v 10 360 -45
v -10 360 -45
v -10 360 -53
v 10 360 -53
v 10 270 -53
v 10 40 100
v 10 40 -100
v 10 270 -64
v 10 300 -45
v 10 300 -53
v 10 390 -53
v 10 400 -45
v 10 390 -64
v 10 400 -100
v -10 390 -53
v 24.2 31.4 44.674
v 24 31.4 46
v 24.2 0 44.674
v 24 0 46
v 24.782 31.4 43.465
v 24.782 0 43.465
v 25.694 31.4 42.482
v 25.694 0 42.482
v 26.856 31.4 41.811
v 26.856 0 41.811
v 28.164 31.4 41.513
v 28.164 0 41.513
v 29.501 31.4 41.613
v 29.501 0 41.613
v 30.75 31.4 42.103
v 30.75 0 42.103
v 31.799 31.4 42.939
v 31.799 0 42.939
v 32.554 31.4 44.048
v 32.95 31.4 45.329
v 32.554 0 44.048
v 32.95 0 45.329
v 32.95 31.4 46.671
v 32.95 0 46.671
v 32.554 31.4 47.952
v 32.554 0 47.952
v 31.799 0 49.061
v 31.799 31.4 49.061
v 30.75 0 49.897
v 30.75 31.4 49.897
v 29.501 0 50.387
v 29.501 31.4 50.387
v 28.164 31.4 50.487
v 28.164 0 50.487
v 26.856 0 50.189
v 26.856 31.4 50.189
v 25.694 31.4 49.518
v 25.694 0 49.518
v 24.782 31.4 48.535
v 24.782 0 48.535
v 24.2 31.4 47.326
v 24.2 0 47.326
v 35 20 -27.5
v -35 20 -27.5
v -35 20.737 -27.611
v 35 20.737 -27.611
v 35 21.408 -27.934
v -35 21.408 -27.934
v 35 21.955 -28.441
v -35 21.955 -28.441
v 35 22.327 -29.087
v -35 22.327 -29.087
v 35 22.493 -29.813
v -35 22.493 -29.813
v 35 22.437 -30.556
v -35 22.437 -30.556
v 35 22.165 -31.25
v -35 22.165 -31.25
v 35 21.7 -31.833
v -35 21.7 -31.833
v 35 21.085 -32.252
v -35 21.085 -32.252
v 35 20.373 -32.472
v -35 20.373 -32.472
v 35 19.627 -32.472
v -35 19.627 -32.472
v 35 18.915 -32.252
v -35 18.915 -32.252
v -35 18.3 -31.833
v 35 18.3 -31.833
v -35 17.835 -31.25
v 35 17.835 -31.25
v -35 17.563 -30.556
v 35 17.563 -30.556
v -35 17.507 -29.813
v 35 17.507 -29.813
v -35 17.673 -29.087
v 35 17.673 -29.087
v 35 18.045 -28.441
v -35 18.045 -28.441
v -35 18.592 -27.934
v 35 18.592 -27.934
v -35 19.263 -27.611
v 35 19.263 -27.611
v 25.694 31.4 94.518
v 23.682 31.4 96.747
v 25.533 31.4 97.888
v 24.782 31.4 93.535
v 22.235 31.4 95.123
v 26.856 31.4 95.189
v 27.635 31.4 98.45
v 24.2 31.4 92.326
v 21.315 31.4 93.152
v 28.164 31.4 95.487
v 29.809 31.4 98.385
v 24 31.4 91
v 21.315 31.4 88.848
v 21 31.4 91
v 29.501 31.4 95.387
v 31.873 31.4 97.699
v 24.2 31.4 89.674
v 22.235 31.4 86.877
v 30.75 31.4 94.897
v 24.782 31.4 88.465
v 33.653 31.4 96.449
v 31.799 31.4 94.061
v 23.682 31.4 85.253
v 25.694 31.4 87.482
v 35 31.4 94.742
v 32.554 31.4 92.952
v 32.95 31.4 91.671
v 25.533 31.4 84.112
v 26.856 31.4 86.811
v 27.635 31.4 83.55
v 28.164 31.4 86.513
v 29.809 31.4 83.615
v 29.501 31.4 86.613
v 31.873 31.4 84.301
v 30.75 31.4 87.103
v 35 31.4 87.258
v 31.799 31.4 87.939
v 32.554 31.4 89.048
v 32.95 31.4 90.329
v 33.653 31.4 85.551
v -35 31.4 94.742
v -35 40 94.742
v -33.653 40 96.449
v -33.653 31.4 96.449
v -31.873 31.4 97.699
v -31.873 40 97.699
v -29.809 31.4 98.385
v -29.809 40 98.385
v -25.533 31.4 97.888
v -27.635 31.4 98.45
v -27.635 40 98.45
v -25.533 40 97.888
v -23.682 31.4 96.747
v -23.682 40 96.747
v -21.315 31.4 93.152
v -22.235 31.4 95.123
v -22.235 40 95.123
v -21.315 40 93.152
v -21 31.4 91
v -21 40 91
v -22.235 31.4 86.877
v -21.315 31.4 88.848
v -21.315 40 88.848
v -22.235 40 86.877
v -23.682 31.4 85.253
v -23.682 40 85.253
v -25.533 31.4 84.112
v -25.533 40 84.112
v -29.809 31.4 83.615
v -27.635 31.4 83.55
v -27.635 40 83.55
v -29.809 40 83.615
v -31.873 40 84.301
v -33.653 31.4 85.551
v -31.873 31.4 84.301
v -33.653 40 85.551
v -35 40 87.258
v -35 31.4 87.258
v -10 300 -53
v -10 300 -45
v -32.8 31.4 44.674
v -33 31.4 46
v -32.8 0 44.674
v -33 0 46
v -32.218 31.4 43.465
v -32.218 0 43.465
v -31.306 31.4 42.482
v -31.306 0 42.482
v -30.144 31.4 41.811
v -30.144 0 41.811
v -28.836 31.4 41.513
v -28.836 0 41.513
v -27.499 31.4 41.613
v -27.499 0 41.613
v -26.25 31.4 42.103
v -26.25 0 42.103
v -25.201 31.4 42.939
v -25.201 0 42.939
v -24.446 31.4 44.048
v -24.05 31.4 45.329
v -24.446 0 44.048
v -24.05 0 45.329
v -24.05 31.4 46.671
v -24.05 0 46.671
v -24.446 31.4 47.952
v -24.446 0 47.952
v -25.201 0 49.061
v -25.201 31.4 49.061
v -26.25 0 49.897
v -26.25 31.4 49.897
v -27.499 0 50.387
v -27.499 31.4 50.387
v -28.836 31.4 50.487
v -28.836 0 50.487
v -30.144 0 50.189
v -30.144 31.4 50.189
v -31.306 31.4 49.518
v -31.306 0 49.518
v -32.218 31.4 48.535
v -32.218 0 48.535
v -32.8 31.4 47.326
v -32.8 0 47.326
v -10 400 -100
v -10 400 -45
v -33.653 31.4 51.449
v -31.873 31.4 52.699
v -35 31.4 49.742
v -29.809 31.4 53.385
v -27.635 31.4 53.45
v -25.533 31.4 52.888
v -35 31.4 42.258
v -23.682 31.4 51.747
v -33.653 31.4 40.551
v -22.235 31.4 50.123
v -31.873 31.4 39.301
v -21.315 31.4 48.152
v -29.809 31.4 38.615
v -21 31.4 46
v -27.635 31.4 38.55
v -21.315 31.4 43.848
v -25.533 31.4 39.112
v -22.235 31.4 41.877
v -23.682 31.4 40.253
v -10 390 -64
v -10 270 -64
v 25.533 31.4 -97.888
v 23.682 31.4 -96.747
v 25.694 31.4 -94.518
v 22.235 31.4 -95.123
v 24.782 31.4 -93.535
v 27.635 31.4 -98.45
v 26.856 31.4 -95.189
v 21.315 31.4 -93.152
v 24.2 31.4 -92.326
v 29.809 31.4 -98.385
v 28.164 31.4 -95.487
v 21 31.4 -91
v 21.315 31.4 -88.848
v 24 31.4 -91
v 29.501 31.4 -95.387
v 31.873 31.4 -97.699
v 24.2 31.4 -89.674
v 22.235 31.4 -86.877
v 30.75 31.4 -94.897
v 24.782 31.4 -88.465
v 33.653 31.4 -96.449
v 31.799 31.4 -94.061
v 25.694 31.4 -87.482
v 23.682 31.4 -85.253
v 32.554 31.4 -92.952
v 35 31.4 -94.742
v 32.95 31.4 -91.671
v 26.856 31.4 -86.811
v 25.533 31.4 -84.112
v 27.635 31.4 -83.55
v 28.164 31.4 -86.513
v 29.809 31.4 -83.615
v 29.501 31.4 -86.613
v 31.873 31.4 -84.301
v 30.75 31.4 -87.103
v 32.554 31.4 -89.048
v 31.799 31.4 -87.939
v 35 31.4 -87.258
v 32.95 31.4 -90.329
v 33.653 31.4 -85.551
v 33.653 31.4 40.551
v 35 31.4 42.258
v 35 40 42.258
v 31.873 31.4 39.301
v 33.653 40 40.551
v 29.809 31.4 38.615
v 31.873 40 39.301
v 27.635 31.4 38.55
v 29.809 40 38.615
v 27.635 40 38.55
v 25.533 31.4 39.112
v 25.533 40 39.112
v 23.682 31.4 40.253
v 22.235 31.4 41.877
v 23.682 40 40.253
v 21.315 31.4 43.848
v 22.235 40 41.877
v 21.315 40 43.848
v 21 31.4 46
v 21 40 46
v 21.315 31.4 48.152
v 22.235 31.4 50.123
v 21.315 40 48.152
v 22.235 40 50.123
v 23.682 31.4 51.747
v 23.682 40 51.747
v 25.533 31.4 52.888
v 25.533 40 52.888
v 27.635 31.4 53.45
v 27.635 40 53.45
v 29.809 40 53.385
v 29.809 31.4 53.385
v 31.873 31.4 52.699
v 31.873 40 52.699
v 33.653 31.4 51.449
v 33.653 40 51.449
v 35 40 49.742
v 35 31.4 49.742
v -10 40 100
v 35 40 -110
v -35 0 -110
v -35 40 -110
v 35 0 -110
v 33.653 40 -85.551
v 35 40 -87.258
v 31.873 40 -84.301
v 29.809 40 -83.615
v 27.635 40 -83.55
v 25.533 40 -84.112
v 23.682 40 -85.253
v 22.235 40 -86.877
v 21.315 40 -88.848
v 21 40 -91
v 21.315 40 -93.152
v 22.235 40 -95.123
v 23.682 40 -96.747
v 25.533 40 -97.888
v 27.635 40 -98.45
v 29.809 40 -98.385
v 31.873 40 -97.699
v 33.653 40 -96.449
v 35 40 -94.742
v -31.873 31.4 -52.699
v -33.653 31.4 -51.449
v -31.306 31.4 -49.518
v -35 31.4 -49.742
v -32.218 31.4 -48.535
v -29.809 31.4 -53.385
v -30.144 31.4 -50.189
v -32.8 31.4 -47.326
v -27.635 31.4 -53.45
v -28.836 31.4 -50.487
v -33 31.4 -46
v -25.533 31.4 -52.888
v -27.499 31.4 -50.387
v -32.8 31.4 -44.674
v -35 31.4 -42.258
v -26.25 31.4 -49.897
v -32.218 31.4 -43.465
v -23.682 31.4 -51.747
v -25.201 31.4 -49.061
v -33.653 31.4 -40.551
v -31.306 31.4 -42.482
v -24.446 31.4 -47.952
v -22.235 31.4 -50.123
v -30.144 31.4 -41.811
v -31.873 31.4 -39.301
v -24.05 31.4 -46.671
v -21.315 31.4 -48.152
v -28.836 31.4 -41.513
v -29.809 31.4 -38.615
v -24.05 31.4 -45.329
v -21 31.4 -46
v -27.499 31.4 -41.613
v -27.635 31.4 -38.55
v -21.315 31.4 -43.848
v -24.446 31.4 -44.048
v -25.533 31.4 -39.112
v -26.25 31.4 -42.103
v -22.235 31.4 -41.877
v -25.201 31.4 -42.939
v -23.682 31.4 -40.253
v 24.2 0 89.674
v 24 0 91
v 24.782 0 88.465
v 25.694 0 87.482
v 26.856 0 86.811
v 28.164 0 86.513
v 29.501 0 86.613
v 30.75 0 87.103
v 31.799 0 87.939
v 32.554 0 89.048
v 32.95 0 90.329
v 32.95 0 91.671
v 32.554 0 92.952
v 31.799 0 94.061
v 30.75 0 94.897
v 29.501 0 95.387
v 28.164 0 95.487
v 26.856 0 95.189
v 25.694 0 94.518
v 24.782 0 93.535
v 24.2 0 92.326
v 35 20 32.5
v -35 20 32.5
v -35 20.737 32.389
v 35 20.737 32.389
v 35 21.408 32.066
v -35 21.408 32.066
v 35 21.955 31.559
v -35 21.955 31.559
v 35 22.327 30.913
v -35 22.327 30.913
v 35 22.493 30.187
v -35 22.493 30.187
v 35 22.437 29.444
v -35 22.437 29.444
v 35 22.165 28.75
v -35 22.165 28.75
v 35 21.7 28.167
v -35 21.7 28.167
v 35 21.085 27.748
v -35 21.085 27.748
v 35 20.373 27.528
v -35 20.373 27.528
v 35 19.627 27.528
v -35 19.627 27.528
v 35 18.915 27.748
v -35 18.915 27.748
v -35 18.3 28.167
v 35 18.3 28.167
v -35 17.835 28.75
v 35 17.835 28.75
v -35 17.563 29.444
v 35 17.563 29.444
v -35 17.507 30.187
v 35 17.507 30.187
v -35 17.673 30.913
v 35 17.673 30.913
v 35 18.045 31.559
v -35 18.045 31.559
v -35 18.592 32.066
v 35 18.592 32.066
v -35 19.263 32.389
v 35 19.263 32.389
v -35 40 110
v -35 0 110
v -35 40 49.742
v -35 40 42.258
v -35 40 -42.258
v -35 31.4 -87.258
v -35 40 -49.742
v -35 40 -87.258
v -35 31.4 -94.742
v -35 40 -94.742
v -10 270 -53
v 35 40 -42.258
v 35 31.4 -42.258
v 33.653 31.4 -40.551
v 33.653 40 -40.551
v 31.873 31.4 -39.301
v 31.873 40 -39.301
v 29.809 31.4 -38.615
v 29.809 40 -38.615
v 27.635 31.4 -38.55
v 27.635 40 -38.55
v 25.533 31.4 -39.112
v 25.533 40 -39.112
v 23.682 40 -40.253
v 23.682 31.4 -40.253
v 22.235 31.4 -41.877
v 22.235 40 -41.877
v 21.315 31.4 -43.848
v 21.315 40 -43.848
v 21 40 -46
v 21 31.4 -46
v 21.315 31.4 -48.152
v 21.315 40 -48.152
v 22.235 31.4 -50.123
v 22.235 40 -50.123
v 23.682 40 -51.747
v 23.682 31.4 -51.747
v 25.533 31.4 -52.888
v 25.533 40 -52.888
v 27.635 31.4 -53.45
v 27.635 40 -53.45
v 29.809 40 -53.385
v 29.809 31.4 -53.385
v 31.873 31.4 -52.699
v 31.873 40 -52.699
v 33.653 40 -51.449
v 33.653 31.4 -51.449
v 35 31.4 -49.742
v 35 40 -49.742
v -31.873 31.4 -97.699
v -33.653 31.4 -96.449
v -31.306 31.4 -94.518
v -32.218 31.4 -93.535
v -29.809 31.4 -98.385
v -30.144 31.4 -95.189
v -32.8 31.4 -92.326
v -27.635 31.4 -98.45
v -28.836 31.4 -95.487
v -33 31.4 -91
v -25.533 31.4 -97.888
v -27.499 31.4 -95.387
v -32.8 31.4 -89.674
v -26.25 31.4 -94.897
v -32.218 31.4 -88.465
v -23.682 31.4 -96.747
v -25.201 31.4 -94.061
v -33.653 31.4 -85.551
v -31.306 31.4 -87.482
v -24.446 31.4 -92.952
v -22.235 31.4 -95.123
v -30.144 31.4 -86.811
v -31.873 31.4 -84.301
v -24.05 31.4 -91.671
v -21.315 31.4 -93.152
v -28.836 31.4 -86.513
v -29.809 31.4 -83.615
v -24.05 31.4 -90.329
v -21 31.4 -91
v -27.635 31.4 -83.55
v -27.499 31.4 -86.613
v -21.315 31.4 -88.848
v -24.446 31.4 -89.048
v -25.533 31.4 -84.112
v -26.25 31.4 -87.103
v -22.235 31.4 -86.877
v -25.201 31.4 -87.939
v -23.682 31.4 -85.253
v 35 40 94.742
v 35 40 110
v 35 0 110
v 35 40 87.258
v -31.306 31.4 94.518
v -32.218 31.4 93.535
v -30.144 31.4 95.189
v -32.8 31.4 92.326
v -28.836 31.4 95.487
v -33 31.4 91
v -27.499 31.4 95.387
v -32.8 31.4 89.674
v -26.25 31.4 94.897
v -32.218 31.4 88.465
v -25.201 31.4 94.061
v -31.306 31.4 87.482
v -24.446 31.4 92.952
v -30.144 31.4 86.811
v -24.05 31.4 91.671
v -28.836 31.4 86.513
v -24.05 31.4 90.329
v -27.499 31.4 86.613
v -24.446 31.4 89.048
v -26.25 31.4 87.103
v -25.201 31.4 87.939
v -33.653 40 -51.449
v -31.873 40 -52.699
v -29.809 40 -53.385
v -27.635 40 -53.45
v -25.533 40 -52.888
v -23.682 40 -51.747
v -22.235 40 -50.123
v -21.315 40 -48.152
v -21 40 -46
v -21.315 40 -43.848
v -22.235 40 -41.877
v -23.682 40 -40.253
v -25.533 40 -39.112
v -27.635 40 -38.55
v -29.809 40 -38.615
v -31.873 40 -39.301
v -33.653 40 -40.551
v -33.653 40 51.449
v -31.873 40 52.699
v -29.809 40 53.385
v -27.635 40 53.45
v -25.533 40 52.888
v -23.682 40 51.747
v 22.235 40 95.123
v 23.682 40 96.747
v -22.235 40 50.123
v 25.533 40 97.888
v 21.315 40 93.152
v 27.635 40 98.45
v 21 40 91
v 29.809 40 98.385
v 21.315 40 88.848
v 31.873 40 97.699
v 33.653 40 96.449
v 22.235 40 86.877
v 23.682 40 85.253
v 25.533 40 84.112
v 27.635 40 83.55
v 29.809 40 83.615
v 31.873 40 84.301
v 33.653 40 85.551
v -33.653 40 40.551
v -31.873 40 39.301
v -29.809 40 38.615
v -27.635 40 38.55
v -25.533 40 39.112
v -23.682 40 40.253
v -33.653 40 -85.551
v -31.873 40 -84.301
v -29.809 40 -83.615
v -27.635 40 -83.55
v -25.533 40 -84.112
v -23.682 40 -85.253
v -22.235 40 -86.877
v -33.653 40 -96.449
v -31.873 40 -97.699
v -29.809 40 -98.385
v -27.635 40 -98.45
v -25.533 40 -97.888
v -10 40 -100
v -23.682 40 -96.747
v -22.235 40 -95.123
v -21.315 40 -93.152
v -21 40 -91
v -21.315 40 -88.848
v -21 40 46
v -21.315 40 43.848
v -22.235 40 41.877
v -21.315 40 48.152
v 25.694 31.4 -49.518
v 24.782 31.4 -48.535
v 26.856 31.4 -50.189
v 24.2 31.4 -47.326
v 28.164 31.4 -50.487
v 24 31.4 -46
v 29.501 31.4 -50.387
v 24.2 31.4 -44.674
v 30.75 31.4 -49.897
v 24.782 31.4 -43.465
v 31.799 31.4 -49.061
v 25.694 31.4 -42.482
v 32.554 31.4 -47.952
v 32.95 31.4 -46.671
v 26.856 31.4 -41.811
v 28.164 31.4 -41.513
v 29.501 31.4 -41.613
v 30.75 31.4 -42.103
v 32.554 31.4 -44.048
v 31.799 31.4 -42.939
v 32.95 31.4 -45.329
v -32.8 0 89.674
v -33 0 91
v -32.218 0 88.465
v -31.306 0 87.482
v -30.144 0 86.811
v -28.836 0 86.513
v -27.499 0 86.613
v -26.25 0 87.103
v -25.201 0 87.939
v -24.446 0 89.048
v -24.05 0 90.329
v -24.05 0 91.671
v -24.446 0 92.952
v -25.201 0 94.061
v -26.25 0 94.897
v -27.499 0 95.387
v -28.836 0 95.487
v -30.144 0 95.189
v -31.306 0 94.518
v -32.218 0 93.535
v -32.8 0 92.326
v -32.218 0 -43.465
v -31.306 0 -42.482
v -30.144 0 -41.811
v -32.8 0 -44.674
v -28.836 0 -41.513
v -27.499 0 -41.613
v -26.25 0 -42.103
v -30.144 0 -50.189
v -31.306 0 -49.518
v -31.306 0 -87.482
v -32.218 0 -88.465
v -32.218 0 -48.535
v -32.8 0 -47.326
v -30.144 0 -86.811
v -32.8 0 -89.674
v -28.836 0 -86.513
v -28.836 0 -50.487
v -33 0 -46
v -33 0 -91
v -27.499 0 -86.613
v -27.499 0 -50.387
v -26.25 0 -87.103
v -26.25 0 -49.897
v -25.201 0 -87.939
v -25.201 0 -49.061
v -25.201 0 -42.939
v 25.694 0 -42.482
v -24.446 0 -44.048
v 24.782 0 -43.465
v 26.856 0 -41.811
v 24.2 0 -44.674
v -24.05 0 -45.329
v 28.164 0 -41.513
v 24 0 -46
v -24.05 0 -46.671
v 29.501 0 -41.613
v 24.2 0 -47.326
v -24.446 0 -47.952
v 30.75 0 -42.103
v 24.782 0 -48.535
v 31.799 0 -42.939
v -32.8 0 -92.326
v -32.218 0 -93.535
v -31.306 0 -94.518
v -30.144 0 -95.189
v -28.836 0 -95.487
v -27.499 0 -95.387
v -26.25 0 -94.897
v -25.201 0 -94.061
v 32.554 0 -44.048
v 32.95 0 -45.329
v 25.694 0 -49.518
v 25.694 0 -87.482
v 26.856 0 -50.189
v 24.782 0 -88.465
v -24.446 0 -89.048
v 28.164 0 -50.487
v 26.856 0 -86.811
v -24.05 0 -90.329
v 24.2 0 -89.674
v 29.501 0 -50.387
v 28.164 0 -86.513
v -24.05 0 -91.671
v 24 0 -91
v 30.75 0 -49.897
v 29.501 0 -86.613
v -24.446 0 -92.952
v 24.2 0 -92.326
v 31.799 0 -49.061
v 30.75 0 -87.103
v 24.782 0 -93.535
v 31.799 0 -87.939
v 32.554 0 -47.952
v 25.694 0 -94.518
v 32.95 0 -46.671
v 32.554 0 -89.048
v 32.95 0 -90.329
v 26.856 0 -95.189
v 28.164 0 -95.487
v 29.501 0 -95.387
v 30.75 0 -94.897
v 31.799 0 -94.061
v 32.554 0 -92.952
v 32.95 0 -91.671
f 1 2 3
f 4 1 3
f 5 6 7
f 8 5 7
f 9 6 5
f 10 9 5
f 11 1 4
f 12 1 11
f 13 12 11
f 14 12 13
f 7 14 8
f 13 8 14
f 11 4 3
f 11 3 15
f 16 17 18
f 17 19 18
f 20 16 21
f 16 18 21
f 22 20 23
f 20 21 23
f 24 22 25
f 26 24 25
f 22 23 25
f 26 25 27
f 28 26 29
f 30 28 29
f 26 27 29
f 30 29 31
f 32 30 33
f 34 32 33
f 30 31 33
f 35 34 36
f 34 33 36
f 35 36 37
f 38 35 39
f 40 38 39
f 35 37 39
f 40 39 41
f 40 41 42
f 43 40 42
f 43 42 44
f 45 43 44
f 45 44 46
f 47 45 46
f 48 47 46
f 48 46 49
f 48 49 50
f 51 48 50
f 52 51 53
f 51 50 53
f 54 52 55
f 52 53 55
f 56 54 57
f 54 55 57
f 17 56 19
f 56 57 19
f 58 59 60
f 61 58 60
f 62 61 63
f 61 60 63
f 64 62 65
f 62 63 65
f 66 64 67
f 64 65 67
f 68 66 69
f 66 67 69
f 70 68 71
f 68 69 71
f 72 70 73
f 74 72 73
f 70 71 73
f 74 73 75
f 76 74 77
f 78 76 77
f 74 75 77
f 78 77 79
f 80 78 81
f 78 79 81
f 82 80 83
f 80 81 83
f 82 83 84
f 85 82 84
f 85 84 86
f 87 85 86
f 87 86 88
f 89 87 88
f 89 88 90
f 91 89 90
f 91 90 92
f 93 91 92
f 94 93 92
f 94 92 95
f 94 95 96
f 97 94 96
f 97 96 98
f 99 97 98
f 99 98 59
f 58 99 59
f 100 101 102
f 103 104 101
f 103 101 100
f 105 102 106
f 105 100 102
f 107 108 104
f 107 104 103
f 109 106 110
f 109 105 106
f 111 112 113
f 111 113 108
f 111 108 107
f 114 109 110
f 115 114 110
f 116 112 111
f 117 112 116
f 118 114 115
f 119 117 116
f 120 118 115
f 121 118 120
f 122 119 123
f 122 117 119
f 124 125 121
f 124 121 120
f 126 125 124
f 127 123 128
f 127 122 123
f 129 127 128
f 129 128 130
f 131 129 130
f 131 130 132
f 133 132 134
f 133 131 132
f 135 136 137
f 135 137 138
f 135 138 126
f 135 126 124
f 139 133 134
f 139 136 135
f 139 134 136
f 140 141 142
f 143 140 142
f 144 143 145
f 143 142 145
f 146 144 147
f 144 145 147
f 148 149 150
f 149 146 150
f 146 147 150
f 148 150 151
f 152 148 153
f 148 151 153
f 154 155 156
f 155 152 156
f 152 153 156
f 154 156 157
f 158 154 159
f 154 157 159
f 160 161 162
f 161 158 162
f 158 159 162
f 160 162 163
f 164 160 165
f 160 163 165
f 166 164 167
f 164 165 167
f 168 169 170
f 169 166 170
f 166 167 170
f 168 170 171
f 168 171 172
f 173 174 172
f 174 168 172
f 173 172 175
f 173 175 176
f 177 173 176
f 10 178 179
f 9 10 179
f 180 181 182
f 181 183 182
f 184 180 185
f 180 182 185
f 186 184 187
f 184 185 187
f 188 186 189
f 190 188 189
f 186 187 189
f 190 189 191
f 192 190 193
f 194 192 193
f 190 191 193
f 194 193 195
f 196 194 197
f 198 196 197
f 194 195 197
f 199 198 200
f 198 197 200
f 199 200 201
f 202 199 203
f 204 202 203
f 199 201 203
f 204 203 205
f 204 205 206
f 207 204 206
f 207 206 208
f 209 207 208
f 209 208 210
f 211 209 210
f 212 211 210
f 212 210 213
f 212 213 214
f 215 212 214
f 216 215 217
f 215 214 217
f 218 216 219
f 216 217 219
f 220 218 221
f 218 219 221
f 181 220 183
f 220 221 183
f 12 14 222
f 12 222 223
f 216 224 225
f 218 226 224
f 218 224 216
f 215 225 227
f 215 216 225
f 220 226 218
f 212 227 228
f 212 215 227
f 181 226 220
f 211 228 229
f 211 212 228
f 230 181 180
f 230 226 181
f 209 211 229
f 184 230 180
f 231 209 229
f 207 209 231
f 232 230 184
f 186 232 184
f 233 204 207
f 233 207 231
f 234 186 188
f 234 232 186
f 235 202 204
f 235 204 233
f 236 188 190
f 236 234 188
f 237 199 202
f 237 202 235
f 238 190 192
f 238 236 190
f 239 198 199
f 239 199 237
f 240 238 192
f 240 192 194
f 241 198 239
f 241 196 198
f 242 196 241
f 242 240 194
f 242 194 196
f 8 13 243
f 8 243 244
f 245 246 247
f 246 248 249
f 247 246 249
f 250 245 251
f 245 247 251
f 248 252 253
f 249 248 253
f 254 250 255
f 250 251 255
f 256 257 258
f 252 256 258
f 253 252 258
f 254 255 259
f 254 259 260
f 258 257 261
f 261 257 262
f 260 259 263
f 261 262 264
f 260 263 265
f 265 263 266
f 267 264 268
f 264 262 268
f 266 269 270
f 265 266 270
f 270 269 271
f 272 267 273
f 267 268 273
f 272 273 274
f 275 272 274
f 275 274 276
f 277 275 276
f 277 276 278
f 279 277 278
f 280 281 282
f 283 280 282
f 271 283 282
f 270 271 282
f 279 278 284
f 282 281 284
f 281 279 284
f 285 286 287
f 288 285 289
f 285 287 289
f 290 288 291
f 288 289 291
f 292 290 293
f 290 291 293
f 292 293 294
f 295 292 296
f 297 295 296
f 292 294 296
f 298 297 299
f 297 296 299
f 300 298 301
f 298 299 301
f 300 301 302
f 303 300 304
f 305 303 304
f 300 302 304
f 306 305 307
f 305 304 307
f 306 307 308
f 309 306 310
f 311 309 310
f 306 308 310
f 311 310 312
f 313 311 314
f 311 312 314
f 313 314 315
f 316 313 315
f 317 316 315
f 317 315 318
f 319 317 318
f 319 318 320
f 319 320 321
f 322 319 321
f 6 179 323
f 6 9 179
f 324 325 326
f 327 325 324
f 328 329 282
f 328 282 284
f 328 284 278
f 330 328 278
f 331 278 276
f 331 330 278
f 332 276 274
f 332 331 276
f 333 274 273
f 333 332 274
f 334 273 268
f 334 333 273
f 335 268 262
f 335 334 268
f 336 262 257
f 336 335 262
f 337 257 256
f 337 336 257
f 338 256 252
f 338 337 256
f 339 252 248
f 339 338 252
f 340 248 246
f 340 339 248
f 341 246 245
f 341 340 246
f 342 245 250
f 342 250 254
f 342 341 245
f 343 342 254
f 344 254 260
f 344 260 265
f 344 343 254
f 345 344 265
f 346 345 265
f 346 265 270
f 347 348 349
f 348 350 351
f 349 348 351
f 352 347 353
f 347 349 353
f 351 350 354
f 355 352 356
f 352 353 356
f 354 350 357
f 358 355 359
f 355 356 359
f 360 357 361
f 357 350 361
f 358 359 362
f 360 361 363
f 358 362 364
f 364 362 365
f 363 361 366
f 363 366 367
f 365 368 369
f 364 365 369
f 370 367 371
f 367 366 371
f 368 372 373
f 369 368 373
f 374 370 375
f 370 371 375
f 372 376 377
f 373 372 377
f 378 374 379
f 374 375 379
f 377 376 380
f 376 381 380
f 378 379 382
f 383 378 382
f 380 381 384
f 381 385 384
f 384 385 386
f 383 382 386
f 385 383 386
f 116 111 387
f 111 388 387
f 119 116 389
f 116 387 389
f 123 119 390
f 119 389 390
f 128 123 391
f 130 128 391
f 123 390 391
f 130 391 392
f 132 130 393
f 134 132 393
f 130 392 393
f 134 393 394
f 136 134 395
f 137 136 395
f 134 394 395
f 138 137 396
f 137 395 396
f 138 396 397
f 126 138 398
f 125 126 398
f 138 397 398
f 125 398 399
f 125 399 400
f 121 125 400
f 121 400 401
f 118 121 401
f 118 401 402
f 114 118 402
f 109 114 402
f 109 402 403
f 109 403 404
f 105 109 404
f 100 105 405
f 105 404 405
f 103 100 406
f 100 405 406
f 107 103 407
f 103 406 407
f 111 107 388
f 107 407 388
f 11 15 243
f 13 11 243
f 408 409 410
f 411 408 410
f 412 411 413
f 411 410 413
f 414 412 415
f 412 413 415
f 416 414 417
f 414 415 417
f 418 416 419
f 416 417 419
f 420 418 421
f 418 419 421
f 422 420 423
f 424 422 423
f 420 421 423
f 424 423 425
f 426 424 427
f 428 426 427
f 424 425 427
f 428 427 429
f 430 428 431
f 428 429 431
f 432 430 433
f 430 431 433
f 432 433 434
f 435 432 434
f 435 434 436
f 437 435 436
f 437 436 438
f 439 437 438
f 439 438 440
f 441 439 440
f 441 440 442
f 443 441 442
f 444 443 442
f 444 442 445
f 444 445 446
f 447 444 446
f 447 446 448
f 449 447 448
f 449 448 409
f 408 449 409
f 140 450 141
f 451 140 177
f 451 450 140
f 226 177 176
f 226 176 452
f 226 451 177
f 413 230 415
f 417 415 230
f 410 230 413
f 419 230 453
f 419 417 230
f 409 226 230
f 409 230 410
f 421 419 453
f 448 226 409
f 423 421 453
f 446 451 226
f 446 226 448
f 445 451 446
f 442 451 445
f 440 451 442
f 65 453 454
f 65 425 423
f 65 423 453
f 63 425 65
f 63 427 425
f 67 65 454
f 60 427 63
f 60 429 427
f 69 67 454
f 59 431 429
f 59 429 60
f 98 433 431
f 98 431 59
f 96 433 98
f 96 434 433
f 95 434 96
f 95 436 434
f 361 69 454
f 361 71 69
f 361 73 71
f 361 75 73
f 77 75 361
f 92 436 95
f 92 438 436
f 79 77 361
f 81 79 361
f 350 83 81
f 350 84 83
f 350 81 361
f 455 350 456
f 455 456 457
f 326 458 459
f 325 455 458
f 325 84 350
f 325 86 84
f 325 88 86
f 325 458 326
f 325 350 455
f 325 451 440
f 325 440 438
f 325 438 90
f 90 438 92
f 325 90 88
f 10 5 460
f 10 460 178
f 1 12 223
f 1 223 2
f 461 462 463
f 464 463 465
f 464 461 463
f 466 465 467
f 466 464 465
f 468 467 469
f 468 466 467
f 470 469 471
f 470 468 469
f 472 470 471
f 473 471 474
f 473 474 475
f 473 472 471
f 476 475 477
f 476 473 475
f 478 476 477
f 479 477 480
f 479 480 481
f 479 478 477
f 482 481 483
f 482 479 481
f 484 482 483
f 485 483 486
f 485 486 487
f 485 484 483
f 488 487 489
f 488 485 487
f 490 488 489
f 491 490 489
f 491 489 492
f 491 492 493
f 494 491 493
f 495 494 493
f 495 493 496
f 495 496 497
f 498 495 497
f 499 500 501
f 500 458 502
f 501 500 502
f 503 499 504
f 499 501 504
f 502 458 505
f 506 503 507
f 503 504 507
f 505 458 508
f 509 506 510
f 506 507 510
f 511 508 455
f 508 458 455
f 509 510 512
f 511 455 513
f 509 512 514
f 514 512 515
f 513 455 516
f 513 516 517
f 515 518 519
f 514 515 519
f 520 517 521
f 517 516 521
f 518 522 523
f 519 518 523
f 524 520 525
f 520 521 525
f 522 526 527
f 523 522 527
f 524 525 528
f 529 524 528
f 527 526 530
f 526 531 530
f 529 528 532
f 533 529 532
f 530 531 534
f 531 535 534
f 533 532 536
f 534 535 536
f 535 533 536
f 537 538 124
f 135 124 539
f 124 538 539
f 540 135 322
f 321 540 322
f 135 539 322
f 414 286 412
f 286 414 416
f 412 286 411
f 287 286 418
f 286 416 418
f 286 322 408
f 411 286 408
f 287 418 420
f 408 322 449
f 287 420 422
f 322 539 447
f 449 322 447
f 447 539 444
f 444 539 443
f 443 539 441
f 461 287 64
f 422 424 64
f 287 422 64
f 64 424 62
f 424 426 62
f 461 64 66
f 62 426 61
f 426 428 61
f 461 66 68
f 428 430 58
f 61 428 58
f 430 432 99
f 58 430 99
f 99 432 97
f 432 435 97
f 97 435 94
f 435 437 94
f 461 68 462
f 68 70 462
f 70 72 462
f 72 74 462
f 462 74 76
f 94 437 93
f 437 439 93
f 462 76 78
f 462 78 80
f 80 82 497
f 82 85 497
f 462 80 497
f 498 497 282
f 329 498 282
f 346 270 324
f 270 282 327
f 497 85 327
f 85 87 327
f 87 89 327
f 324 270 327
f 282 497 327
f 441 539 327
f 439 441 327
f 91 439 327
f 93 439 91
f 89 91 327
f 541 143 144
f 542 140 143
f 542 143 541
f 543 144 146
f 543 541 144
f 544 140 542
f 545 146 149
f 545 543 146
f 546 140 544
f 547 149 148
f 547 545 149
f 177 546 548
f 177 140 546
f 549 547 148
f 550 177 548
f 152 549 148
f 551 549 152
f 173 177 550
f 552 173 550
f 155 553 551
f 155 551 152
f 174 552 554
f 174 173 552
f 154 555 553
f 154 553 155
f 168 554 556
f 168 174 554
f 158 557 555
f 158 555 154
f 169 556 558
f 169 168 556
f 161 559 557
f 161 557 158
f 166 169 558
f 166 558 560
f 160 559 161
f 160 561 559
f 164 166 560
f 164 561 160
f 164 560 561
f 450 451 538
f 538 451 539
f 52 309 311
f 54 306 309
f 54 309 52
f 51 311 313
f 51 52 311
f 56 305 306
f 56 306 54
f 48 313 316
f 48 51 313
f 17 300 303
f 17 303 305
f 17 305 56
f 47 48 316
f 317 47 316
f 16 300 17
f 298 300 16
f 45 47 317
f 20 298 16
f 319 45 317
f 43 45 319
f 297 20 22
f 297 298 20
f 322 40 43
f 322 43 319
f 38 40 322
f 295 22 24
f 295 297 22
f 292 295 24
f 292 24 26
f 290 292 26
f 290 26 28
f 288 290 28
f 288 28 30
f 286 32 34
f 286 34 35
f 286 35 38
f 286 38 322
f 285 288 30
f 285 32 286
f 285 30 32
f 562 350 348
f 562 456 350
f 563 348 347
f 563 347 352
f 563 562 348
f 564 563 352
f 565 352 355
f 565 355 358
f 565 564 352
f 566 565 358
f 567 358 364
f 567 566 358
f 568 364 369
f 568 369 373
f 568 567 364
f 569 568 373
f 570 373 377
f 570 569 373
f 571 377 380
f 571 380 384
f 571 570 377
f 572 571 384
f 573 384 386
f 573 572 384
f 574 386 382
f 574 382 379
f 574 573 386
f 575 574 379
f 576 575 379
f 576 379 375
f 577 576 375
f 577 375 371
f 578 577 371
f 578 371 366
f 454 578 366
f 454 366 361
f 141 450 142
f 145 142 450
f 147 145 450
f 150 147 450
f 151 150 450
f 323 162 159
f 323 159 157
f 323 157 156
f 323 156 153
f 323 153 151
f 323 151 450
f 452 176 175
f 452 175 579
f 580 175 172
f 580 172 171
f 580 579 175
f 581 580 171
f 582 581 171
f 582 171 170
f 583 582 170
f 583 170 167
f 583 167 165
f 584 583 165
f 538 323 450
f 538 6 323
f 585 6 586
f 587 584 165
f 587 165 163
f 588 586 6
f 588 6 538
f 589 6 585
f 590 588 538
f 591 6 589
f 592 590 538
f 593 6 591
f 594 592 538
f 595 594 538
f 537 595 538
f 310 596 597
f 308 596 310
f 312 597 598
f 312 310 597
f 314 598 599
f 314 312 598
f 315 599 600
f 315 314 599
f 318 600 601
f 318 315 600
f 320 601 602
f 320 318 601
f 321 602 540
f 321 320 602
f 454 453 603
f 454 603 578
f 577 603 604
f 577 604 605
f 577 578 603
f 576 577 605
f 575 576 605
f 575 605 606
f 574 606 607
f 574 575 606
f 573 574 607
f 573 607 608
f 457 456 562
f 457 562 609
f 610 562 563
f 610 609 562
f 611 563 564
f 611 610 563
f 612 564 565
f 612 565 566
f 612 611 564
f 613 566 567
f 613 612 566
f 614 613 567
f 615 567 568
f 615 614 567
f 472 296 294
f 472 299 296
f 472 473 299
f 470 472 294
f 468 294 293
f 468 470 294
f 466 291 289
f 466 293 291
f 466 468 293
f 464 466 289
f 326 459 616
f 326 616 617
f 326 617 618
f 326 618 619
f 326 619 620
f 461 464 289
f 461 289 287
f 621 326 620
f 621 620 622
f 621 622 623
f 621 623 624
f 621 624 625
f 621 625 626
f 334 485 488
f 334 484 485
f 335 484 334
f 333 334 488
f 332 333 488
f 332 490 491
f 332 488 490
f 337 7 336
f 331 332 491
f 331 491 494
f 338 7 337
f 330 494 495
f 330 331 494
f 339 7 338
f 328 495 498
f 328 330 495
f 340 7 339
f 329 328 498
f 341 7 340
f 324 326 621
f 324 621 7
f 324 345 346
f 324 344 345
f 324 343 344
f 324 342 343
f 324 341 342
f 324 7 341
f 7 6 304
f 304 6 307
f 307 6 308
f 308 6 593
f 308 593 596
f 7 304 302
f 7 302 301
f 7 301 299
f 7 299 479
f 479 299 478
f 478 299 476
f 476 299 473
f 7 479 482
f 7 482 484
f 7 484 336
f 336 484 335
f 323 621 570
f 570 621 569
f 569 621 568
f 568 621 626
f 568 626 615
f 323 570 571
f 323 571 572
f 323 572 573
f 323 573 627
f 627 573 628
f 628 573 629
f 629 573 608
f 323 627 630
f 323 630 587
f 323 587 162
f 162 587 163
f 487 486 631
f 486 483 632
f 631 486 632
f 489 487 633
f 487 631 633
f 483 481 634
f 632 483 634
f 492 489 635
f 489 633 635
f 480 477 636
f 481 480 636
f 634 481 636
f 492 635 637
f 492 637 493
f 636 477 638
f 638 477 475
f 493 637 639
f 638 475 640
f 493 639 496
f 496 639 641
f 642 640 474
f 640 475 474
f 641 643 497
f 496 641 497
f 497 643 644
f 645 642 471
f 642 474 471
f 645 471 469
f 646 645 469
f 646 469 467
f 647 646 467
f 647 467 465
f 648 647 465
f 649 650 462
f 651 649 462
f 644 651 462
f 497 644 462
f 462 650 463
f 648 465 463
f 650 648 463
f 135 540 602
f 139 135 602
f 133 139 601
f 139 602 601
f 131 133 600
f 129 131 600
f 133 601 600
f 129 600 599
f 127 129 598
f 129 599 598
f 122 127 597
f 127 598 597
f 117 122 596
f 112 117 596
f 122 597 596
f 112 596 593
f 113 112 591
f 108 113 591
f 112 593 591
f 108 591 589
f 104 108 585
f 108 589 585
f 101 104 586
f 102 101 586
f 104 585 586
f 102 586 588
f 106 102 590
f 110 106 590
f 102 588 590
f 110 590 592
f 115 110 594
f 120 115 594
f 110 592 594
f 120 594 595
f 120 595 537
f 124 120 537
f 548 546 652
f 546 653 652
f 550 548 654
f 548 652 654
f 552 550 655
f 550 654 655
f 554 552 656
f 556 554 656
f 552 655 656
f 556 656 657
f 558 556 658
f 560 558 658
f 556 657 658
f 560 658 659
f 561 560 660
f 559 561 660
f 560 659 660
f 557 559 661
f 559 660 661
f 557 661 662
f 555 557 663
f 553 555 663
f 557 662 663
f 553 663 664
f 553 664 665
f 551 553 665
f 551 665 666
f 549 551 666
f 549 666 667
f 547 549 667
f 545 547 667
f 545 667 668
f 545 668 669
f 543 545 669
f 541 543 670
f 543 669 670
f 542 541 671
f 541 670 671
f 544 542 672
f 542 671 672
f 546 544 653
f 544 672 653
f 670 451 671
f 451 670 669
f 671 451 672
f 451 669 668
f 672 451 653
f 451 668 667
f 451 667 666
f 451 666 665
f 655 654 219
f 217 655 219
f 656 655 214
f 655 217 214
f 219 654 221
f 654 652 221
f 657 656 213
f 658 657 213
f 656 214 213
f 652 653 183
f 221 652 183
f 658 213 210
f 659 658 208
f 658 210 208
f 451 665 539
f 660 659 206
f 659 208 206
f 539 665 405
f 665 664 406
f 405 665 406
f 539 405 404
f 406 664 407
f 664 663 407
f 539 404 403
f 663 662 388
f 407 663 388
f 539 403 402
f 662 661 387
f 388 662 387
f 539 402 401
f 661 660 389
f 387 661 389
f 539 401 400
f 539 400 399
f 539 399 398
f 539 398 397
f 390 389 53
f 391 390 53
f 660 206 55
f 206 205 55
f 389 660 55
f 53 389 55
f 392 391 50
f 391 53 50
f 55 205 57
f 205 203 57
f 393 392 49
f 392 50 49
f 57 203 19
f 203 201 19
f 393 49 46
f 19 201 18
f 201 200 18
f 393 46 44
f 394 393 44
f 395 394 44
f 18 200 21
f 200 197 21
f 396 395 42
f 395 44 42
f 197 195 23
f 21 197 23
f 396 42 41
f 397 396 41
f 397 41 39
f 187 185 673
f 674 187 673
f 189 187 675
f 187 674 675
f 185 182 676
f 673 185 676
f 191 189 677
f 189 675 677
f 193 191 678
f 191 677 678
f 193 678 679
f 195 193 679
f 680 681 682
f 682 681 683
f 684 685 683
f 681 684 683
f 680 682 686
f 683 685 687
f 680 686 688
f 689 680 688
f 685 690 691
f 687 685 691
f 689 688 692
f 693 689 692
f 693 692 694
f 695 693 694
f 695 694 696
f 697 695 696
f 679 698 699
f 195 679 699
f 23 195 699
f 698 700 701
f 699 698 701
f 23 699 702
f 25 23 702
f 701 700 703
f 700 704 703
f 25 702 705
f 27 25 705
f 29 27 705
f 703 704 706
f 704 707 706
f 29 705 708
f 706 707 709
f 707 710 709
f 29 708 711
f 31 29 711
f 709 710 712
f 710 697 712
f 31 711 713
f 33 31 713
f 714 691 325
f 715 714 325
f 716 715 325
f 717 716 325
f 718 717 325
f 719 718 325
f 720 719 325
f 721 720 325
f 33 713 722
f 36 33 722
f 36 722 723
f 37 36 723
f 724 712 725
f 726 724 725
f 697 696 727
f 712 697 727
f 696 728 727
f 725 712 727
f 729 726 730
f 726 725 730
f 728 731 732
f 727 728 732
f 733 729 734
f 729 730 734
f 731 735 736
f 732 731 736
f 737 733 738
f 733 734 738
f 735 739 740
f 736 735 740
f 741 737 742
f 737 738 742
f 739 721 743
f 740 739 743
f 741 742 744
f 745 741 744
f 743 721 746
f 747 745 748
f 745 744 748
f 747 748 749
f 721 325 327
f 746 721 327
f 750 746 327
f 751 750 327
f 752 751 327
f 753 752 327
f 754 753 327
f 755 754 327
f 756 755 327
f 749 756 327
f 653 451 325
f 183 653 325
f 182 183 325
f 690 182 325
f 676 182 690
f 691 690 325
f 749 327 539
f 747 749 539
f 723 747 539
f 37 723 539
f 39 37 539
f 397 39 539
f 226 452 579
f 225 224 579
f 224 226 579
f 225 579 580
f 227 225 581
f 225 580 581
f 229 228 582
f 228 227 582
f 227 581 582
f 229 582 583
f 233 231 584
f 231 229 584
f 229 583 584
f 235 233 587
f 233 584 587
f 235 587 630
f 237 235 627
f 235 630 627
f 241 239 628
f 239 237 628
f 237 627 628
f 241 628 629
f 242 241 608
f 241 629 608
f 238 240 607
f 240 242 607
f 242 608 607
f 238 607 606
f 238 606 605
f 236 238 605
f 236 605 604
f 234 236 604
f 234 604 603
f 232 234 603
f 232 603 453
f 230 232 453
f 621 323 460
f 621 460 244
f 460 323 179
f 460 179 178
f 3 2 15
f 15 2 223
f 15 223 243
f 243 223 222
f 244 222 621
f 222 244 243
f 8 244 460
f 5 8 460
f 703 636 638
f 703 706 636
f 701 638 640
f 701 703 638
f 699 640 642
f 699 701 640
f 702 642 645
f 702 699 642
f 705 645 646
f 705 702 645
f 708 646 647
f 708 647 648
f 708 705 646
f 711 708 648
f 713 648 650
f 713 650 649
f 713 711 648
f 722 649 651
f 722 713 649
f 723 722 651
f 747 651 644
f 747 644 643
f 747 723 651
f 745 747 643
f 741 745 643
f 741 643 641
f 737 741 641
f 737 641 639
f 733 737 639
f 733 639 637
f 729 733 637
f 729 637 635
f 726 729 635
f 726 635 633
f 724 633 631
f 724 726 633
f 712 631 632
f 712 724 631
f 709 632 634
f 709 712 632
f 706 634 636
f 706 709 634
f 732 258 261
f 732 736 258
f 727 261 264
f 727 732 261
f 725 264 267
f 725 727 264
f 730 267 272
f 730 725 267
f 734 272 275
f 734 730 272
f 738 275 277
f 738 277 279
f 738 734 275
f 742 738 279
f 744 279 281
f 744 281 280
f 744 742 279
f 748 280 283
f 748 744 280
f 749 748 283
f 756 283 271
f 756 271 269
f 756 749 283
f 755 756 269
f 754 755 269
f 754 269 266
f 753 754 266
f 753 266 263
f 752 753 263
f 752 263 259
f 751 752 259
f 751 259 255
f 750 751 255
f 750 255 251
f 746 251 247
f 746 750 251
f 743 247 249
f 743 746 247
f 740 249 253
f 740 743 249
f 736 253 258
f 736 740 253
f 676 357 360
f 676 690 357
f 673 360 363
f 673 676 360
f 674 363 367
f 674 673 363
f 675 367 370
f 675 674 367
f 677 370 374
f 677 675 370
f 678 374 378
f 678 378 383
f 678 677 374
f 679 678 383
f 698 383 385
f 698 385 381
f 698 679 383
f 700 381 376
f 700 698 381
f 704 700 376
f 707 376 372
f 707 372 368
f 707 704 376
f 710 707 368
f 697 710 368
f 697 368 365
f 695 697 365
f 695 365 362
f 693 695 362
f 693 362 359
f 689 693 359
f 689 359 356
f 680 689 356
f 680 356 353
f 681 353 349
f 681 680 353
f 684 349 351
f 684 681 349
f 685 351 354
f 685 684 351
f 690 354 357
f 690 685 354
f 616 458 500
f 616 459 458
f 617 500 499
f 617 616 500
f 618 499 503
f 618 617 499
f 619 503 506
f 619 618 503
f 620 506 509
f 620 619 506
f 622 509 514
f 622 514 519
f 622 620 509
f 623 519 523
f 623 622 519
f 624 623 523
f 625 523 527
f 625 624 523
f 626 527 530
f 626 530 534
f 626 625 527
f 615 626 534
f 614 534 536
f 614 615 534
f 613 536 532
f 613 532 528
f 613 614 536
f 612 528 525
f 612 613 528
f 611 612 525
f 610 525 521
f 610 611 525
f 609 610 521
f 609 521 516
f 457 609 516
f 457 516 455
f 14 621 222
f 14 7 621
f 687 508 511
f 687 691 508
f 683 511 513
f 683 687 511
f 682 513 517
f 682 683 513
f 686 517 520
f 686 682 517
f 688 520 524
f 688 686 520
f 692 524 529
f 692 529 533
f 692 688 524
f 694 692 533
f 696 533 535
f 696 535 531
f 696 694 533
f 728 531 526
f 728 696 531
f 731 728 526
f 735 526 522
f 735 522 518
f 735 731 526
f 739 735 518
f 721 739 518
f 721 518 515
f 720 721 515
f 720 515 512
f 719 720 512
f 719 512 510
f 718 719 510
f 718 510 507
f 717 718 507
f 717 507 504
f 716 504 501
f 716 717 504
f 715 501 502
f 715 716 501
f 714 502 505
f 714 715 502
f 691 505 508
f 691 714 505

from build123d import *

# Parameters (mm, degrees)
SKETCH_1_W                  = 70
SKETCH_1_H                  = 220
EXTRUDE_1_DEPTH             = 40
HOLE_WIZARD_M81_D           = 9
HOLE_WIZARD_M81_CBORE_D     = 15
HOLE_WIZARD_M81_CBORE_DEPTH = 8.6
EXTRUDE_2_DEPTH             = 10
HOLE_WIZARD_M61_D           = 5


with BuildPart() as part:
    # Эскиз1 → Бобышка-Вытянуть1 (new body)
    with BuildSketch(Plane(origin=(0, 0, 0), x_dir=(1, 0, 0), z_dir=(0, 1, 0))):
        Rectangle(SKETCH_1_W, SKETCH_1_H)
    extrude(amount=EXTRUDE_1_DEPTH)

    # Цековка для  винта с внутренним шестигранником M81 (through all)
    with Locations(Plane(origin=(0, 40, 0), x_dir=(1, 0, 0), z_dir=(0, 1, 0))):
        with Locations((-28.5, -46), (28.5, -46), (28.5, -91), (-28.5, -91)):
            hole_wizard_m81 = CounterBoreHole(HOLE_WIZARD_M81_D / 2, HOLE_WIZARD_M81_CBORE_D / 2, HOLE_WIZARD_M81_CBORE_DEPTH)

    # Зеркальное отражение1: Цековка для  винта с внутренним шестигранником M81 across plane
    add(hole_wizard_m81.mirror(Plane.XY), mode=Mode.SUBTRACT)

    # Эскиз4 → Бобышка-Вытянуть2 (add, symmetric)
    with BuildSketch(Plane(origin=(0, 0, 0), x_dir=(0, 0, -1), z_dir=(1, 0, 0))):
        Polygon((100, 40), (100, 400), (45, 400), (45, 360), (53, 360), (53, 390), (64, 390), (64, 270), (53, 270), (53, 300), (45, 300), (-100, 40), align=None)
    extrude(amount=EXTRUDE_2_DEPTH, both=True)

    # Отверстие обработанное метчиком M61 (through all)
    with Locations(Plane(origin=(35, 0, 0), x_dir=(0, 0, -1), z_dir=(1, 0, 0))):
        with Locations((-30, 20), (30, 20)):
            Hole(HOLE_WIZARD_M61_D / 2)


solid = part.part
